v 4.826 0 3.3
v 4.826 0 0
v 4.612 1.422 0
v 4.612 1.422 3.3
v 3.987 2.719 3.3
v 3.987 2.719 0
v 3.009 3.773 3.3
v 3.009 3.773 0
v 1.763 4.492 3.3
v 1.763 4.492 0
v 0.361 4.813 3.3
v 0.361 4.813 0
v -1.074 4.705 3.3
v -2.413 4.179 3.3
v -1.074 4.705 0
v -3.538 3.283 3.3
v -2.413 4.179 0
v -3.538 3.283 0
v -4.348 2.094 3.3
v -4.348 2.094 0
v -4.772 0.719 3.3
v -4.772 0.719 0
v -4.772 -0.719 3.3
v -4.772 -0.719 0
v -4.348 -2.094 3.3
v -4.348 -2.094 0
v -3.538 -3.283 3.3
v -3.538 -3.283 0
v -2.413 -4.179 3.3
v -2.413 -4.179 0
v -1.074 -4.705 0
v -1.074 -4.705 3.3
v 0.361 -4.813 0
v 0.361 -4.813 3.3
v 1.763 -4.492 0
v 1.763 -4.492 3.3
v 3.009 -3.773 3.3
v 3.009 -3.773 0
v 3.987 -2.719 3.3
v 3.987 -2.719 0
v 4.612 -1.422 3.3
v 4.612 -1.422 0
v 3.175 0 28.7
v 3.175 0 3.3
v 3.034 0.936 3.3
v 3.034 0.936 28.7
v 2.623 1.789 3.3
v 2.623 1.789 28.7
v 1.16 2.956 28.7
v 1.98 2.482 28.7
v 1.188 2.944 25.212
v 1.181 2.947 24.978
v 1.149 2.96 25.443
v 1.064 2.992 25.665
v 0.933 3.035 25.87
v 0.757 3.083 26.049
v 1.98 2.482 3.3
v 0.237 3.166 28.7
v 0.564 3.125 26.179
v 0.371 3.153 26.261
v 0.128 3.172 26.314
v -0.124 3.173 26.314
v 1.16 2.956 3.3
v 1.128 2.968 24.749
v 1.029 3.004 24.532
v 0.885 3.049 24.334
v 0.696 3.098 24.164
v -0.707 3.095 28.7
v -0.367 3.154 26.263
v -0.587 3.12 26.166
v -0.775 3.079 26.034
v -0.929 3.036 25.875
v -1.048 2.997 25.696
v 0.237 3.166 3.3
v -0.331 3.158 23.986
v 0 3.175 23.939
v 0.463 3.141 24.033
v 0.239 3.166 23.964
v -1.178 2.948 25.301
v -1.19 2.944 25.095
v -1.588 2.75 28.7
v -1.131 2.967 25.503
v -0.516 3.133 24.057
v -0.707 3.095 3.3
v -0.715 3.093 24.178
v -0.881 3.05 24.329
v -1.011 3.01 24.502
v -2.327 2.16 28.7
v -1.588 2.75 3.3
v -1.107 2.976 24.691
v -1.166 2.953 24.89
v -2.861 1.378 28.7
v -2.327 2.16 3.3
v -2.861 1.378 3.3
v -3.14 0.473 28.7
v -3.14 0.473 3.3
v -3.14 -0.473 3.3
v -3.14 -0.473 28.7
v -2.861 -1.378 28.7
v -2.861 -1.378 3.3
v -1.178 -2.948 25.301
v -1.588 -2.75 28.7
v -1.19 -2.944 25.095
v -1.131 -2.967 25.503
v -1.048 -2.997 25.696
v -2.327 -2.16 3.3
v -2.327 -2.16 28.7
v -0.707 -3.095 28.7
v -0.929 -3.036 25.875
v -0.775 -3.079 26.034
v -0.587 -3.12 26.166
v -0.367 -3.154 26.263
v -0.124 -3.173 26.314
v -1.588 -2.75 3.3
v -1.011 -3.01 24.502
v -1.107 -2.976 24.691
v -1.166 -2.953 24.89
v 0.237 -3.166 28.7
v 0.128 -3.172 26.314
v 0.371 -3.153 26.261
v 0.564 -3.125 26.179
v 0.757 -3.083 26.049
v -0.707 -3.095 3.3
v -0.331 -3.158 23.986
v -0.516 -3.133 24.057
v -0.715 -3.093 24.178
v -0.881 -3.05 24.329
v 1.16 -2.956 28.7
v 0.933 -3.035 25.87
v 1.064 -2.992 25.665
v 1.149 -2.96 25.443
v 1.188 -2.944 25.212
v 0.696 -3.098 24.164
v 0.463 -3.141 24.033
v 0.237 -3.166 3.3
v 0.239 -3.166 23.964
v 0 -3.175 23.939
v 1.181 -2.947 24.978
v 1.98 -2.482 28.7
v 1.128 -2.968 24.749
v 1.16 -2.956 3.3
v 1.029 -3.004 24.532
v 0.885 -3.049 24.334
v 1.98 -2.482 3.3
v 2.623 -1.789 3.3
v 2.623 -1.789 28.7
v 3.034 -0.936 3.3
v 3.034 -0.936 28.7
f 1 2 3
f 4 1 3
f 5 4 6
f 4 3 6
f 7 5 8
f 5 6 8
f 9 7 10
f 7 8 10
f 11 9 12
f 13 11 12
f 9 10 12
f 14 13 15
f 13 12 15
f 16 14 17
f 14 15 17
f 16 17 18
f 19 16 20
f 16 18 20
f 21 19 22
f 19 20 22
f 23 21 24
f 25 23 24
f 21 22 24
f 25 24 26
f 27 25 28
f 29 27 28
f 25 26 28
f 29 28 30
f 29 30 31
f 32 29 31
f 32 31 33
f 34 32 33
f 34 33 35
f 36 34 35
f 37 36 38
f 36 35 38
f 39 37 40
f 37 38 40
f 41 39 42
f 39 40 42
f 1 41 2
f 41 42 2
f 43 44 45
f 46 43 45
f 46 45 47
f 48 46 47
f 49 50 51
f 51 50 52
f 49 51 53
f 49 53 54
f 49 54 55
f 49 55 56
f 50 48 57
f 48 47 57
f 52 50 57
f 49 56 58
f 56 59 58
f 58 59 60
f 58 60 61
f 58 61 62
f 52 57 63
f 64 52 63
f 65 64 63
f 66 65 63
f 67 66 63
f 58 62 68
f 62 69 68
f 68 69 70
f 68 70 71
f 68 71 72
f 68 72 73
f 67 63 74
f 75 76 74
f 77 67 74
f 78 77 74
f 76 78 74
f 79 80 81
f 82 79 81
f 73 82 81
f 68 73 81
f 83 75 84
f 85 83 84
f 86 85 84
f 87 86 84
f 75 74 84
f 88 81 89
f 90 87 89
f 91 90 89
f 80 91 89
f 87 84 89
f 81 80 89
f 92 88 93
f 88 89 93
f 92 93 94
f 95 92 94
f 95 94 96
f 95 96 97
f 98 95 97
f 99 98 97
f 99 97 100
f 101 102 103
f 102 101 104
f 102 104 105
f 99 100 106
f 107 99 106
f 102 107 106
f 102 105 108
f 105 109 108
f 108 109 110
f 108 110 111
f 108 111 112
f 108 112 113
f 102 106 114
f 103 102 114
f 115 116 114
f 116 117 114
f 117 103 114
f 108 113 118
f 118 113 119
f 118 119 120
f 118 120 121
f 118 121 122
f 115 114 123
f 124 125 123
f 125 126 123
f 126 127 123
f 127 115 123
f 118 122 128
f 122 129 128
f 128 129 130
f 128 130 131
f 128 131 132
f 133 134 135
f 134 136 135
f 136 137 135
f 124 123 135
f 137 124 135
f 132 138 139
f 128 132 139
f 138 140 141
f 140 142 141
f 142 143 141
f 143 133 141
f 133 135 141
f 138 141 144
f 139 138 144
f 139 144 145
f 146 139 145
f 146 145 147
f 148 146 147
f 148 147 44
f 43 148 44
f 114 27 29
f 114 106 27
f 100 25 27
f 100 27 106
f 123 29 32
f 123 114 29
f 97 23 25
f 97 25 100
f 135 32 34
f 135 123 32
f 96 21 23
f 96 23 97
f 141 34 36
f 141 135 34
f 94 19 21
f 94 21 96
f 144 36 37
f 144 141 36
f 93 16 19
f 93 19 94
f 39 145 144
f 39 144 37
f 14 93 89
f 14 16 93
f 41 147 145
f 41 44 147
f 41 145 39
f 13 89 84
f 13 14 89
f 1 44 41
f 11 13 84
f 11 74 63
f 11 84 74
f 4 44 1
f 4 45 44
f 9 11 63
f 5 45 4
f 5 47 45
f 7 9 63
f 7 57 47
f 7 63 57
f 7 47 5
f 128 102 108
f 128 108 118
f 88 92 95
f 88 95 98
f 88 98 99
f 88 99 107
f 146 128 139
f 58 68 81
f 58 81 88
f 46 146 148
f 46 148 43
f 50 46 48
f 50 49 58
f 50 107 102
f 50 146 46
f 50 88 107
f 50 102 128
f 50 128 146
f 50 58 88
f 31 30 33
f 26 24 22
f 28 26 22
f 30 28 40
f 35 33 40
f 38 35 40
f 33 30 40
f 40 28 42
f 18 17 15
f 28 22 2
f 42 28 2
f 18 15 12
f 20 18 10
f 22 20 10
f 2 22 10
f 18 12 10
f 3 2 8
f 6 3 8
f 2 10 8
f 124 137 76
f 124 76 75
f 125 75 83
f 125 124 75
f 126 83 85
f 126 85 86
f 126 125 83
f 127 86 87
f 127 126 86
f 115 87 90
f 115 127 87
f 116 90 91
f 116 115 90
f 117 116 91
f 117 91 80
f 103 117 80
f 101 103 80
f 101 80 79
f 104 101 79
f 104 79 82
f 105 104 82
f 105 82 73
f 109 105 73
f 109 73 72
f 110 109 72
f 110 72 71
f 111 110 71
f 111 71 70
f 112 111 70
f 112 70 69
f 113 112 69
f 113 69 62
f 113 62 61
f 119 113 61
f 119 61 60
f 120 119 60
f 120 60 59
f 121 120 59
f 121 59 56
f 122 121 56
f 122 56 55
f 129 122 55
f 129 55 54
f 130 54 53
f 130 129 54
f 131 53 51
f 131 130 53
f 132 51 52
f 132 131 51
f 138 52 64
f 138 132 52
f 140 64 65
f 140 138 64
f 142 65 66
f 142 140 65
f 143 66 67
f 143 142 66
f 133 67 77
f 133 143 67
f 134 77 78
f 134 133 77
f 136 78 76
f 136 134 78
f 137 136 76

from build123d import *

# Parameters (mm, degrees)
SKETCH1_R               = 4.826
BOSS_EXTRUDE1_DEPTH     = 3.3
SKETCH2_R               = 3.175
BOSS_EXTRUDE2_DEPTH     = 25.4
CUT_EXTRUDE1_DEPTH      = 10
CUT_EXTRUDE1_DEPTH_BACK = 10
SKETCH3_R               = 1.190625


with BuildPart() as part:
    # Sketch1 → Boss-Extrude1 (new body)
    with BuildSketch(Plane.XY):
        Circle(SKETCH1_R)
    extrude(amount=BOSS_EXTRUDE1_DEPTH)

    # Sketch2 → Boss-Extrude2 (add)
    with BuildSketch(Plane.XY.offset(3.3)):
        Circle(SKETCH2_R)
    extrude(amount=BOSS_EXTRUDE2_DEPTH)

    # Sketch3 → Cut-Extrude1 (cut, two sides: drawn at the far end of the back side and taken through both)
    with BuildSketch(Plane(origin=(0, 0, 0), x_dir=(1, 0, 0), z_dir=(0, 1, 0)).offset(-CUT_EXTRUDE1_DEPTH_BACK)):
        with Locations((0, -25.13)):
            Circle(SKETCH3_R)
    extrude(amount=CUT_EXTRUDE1_DEPTH + CUT_EXTRUDE1_DEPTH_BACK, mode=Mode.SUBTRACT)


solid = part.part
